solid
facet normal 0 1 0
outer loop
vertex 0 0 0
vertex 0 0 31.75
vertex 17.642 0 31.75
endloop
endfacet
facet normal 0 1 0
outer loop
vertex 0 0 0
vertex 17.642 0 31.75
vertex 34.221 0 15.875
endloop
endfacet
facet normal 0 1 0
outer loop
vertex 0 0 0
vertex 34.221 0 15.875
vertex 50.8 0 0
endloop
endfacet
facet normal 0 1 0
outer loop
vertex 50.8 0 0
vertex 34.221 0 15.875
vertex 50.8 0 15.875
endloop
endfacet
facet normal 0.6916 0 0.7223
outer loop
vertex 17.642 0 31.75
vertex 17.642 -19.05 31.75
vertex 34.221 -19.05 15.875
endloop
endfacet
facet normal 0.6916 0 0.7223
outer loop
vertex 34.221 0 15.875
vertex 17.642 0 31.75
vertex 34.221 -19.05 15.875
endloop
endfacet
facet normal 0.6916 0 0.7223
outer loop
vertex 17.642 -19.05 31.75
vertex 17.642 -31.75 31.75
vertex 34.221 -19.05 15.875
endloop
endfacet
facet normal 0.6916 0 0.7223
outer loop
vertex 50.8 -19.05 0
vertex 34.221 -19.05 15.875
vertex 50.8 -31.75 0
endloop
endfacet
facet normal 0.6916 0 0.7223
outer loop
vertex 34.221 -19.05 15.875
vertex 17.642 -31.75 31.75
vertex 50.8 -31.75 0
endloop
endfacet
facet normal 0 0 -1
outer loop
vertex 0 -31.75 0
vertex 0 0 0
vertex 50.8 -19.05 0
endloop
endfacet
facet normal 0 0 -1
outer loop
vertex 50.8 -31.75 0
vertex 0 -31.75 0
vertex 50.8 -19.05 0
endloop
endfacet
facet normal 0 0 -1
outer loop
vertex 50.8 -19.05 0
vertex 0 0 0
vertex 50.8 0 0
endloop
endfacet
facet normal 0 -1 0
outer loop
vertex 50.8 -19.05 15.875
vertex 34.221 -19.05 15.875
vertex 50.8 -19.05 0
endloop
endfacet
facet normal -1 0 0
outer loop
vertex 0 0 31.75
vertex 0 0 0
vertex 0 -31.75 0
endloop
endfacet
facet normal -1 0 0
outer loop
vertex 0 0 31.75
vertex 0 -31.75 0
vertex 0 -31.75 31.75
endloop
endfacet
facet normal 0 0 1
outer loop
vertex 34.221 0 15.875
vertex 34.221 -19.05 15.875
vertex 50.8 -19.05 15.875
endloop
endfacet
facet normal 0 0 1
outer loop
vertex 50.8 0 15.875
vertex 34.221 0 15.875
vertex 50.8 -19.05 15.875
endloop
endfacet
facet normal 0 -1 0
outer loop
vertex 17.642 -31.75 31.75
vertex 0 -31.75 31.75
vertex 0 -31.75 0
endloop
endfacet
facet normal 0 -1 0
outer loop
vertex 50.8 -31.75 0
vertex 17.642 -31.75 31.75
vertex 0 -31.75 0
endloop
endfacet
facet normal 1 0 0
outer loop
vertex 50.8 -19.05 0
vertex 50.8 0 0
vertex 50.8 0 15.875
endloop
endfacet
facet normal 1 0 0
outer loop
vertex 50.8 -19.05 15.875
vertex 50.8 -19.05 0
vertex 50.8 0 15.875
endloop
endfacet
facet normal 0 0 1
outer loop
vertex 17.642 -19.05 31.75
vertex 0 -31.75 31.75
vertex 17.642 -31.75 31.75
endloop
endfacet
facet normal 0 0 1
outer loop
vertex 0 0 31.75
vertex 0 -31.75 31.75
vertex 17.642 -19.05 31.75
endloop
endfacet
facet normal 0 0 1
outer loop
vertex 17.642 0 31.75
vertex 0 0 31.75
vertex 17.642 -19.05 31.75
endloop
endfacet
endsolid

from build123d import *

# Parameters (mm, degrees)
F0_W     = 50.8
F0_H     = 31.75
F1_DEPTH = 31.75
F3_DEPTH = 12.7
F5_DEPTH = 25.4
F6_W     = 16.5787817255
F6_H     = 7.9375
F7_DEPTH = 25.4
F8_W     = 16.5787817255
F8_H     = 7.9375
F9_DEPTH = 25.4


with BuildPart() as f1:
    # F0 (on Front) → F1 (new body)
    with BuildSketch(Plane.XZ):
        with Locations((25.4, 15.875)):
            Rectangle(F0_W, F0_H)
    extrude(amount=F1_DEPTH)

    # F2 (on face) → F3 (cut)
    with BuildSketch(Plane.XZ.offset(31.75)):
        Polygon((50.8, 31.75), (17.6424365491, 31.75), (50.8, 0), align=None)
    extrude(amount=-F3_DEPTH, mode=Mode.SUBTRACT)

    # F4 (on face) → F5 (cut)
    with BuildSketch(Plane.XZ.offset(19.05)):
        Polygon((17.6424365491, 31.75), (34.2212182745, 15.875), (34.2212182745, 31.75), align=None)
    extrude(amount=-F5_DEPTH, mode=Mode.SUBTRACT)

    # F6 (on face) → F7 (cut)
    with BuildSketch(Plane.XZ.offset(19.05)):
        with Locations((42.5106091373, 27.78125)):
            Rectangle(F6_W, F6_H)
    extrude(amount=-F7_DEPTH, mode=Mode.SUBTRACT)

    # F8 (on face) → F9 (cut)
    with BuildSketch(Plane.XZ.offset(19.05)):
        with Locations((42.5106091373, 19.84375)):
            Rectangle(F8_W, F8_H)
    extrude(amount=-F9_DEPTH, mode=Mode.SUBTRACT)


solid = f1.part
